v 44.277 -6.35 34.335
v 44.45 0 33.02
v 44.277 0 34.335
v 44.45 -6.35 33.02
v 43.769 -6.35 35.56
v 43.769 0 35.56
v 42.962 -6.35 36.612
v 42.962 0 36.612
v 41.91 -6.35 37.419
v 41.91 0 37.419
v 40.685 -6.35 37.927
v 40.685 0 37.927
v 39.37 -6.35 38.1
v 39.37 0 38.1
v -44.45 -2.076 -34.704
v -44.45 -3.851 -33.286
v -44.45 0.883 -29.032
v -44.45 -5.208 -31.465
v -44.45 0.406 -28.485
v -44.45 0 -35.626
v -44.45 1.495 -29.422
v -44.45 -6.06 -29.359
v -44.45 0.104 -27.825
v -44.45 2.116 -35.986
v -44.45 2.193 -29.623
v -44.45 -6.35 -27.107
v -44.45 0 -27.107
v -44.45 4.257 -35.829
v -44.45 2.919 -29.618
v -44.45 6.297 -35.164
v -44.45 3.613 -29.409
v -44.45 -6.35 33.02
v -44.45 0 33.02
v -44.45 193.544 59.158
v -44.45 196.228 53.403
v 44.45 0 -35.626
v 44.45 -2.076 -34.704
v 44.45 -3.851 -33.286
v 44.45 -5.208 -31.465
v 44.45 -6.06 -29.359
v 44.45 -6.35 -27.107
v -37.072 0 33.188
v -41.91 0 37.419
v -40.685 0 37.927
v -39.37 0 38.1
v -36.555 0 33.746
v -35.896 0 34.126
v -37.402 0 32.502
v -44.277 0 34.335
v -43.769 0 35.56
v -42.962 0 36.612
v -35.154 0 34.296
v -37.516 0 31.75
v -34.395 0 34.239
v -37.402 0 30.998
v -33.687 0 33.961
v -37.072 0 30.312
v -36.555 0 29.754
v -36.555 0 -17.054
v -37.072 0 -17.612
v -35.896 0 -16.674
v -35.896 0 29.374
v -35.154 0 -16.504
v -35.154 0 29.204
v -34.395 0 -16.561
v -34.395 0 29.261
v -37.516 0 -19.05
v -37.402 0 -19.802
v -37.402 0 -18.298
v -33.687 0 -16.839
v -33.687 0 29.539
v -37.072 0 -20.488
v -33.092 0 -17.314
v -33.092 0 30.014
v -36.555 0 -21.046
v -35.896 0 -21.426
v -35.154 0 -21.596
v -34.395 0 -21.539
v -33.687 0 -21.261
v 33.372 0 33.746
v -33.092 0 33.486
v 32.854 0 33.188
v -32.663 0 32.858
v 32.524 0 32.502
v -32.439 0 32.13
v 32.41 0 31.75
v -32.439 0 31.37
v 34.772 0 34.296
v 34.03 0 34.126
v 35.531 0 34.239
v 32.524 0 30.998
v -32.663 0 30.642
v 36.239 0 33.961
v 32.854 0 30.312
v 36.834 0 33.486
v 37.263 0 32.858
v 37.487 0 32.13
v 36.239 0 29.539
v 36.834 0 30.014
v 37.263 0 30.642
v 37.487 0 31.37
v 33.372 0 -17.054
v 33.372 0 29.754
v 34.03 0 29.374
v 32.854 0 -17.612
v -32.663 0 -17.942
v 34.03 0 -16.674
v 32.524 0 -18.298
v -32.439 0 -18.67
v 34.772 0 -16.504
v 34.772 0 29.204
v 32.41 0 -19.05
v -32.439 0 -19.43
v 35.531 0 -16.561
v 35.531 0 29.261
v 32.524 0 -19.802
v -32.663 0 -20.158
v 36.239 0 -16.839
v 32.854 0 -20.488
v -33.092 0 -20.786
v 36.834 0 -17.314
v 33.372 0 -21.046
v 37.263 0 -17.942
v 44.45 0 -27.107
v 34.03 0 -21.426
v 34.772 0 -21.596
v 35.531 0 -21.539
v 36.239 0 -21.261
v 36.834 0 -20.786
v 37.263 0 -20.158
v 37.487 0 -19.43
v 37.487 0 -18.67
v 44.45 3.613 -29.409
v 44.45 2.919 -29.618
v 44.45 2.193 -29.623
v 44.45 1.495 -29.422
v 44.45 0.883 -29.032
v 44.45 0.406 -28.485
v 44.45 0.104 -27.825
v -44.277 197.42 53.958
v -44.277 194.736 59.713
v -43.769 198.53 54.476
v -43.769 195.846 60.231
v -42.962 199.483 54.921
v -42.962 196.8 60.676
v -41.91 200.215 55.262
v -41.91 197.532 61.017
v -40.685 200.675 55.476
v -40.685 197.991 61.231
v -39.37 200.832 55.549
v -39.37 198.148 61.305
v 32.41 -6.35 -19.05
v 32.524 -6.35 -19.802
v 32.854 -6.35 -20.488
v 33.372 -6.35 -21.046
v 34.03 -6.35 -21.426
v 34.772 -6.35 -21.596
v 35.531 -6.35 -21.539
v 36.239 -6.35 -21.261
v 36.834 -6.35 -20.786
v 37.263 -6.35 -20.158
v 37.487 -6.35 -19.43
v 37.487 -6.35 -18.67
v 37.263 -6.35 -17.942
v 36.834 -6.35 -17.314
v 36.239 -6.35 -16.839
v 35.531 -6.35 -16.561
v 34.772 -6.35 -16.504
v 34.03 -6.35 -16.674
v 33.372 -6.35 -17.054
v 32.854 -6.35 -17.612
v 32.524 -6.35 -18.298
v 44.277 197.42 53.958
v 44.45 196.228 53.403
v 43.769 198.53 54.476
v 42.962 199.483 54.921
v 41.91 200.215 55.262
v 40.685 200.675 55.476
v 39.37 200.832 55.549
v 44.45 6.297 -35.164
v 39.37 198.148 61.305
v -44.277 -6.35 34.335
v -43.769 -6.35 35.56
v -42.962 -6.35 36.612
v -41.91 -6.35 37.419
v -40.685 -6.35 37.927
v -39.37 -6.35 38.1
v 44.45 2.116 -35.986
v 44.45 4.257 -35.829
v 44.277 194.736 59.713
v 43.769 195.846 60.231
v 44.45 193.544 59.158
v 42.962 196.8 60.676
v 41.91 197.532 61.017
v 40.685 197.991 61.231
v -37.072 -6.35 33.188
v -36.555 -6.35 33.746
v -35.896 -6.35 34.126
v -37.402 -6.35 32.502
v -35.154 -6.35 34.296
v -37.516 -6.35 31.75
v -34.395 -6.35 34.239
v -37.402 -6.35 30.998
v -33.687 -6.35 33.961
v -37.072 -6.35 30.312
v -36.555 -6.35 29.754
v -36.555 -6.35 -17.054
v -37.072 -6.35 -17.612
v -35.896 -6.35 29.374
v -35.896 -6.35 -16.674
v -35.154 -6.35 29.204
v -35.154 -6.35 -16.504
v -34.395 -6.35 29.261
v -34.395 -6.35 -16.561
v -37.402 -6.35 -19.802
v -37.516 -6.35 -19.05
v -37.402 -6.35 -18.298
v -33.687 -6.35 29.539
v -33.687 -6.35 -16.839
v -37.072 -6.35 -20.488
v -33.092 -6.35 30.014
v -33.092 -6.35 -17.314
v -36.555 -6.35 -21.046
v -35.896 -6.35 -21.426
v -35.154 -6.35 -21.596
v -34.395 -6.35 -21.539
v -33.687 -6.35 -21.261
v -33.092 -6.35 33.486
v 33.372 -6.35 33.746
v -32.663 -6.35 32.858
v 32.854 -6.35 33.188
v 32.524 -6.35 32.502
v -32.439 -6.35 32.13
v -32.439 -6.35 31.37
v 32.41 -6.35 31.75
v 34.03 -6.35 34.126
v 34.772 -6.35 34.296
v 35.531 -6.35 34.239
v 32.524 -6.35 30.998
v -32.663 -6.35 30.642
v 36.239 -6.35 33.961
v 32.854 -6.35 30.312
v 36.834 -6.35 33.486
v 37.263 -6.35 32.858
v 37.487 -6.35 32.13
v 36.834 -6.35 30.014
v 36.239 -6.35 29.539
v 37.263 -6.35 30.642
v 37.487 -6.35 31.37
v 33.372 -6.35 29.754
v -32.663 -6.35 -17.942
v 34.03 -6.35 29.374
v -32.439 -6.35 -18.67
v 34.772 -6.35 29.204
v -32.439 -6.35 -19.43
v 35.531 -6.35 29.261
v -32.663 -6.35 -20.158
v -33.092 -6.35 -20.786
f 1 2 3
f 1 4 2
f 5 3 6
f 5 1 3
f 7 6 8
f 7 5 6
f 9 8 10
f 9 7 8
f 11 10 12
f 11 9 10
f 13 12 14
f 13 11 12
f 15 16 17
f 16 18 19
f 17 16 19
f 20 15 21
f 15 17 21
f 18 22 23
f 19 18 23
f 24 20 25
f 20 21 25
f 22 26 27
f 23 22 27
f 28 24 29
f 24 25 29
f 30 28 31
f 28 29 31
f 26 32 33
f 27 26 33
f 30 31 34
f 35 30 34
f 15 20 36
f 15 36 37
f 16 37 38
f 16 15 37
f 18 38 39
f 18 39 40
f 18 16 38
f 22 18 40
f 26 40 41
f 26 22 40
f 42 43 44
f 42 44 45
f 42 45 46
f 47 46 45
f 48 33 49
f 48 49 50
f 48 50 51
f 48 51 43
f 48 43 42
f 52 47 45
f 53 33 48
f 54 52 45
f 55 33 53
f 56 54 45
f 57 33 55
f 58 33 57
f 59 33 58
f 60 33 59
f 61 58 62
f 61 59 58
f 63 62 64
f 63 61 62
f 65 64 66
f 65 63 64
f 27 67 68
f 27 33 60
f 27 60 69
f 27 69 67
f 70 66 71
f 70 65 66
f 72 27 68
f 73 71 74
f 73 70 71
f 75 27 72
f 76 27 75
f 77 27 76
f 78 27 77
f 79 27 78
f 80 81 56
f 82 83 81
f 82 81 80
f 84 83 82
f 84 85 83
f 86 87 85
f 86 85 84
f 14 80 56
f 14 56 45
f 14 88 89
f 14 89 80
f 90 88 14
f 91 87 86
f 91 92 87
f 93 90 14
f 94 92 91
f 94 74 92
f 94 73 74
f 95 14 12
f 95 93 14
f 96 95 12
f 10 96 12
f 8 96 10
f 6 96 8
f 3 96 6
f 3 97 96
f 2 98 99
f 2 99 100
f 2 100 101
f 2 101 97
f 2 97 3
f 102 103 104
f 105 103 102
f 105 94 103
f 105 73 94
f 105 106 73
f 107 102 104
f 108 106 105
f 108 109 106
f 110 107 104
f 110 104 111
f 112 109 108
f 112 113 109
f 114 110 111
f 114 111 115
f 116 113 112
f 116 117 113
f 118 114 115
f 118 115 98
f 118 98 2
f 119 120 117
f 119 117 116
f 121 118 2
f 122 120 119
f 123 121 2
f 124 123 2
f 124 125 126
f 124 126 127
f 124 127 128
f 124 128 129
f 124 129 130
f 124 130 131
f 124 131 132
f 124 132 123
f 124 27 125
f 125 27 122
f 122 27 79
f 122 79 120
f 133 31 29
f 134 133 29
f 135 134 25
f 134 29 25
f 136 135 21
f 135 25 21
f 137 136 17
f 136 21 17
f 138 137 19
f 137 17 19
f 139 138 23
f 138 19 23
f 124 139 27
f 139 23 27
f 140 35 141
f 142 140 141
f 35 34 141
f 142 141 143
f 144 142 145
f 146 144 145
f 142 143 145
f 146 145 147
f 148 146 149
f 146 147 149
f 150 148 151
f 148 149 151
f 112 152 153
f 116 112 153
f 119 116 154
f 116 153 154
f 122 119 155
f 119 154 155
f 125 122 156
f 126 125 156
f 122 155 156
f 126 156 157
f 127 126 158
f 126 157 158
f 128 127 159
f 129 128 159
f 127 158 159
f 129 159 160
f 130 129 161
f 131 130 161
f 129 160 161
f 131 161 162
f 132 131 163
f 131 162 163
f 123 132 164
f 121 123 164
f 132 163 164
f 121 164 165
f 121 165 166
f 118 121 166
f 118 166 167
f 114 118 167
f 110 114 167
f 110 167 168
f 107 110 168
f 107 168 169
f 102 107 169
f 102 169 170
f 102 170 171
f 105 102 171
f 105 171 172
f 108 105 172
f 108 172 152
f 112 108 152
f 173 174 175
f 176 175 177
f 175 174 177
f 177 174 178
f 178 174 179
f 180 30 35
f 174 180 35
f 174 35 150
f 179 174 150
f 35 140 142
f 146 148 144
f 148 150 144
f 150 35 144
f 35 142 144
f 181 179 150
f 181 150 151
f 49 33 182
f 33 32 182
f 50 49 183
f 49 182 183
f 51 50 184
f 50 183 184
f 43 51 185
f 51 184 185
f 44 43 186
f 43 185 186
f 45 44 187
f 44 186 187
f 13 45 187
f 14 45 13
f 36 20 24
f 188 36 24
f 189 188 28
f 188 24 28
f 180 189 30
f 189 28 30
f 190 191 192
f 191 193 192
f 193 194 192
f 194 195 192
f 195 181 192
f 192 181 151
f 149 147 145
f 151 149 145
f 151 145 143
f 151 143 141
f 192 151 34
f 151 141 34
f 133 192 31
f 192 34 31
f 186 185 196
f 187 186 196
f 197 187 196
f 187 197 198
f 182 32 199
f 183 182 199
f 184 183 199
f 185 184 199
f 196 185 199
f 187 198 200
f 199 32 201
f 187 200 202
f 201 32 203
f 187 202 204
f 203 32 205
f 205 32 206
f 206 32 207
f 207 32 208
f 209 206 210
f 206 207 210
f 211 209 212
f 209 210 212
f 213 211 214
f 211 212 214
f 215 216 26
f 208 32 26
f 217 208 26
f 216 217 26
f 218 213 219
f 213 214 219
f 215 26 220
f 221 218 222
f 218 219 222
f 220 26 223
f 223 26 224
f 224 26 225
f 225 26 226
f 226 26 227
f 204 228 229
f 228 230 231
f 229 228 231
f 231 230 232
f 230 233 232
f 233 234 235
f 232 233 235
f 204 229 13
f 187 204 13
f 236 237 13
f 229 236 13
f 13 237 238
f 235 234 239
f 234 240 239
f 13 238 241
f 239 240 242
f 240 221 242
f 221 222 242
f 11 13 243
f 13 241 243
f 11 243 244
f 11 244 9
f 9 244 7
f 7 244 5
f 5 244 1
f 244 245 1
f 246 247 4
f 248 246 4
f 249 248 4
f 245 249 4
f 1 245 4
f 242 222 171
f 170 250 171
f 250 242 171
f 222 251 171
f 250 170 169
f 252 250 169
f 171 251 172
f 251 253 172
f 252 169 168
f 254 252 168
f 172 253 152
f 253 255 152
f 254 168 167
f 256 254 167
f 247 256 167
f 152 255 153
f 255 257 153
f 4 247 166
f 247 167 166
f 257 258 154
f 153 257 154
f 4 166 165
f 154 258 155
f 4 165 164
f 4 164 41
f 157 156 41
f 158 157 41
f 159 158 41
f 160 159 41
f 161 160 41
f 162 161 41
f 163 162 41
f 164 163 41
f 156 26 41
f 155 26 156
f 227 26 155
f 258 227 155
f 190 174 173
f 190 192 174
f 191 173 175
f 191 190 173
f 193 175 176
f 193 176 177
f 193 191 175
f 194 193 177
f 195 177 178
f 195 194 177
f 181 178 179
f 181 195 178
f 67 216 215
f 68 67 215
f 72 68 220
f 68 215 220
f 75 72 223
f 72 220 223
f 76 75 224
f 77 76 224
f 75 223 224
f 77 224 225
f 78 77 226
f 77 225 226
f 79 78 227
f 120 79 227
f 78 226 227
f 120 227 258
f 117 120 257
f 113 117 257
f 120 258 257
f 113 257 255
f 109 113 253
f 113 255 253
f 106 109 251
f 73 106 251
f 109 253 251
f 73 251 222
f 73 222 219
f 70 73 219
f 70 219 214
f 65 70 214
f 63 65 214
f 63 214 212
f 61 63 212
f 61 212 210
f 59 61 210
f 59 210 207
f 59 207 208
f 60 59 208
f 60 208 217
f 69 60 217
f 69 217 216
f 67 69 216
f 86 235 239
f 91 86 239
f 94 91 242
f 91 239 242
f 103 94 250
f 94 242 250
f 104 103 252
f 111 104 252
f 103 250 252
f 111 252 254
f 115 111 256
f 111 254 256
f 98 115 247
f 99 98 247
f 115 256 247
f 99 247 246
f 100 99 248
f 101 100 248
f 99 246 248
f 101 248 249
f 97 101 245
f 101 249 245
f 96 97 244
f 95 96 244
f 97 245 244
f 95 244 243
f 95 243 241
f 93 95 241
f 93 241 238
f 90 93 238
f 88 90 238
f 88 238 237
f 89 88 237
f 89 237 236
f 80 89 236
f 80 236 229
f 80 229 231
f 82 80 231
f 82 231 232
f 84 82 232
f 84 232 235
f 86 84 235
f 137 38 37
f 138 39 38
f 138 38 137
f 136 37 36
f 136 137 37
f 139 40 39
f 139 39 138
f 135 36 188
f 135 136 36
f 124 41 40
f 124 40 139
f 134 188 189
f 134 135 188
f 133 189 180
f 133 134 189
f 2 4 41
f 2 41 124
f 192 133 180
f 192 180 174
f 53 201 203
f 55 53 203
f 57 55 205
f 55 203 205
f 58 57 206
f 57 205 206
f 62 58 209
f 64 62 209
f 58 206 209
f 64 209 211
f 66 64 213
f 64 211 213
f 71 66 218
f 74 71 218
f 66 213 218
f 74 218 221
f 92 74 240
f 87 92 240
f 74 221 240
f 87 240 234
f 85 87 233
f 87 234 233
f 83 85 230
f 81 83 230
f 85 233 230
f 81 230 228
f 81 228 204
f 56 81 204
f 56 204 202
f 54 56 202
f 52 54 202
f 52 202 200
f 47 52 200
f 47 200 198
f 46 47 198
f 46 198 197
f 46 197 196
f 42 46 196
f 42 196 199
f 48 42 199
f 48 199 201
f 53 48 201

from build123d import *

# Parameters (mm, degrees)
SKETCH1_W                      = 88.9
SKETCH1_H                      = 76.2
BASE_FLANGE1_DEPTH             = 6.35
EDGE_FLANGE1_START             = -44.45
EDGE_FLANGE1_DEPTH             = 88.9
EDGE_FLANGE1_2_DEPTH           = 88.9
F_7_0_201_DIAMETER_HOLE1_D     = 5.1054
F_7_0_201_DIAMETER_HOLE1_DEPTH = 6.35
FILLET1_R                      = 5.08


# Read off the part's stored shape, not the designer's step: Edge-Flange1
# Sheet-metal steps are written as plain solids
with BuildPart() as part:
    # Sketch1 → Base-Flange1 (new body)
    with BuildSketch(Plane(origin=(0, 0, 0), x_dir=(1, 0, 0), z_dir=(0, 1, 0))):
        Rectangle(SKETCH1_W, SKETCH1_H)
    extrude(amount=-BASE_FLANGE1_DEPTH)

    # Edge-Flange1 outline → Edge-Flange1 (cut)
    with BuildSketch(Plane.YZ.offset(EDGE_FLANGE1_START)):
        with BuildLine():
            Line((0, -38.1), (0, -35.625967843))
            ThreePointArc((0, -35.625967843), (-4.587857322, -32.419340017), (-6.35, -27.106548849))
            Line((-6.35, -27.106548849), (-6.35, -38.1))
            Line((-6.35, -38.1), (0, -38.1))
        make_face()
    extrude(amount=EDGE_FLANGE1_DEPTH, mode=Mode.SUBTRACT)

    # Edge-Flange1 2 outline → Edge-Flange1 2 (add)
    with BuildSketch(Plane.YZ.offset(EDGE_FLANGE1_START)):
        with BuildLine():
            ThreePointArc((0, -35.625967843), (3.190967678, -35.972683355), (6.297076347, -35.163625075))
            Line((6.297076347, -35.163625075), (200.831960117, 55.549481005))
            Line((200.831960117, 55.549481005), (198.148334155, 61.304535452))
            Line((198.148334155, 61.304535452), (3.613450385, -29.408570628))
            ThreePointArc((3.613450385, -29.408570628), (1.175258995, -29.248763121), (0, -27.106548849))
            Line((0, -27.106548849), (0, -35.625967843))
        make_face()
    extrude(amount=EDGE_FLANGE1_2_DEPTH)

    # #7 (0.201) Diameter Hole1
    with Locations(Plane(origin=(0, 0, 0), x_dir=(1, 0, 0), z_dir=(0, 1, 0))):
        with Locations((-34.9631, 19.05), (34.9631, 19.05), (34.9631, -31.75), (-34.9631, -31.75)):
            Hole(F_7_0_201_DIAMETER_HOLE1_D / 2, depth=F_7_0_201_DIAMETER_HOLE1_DEPTH)

    # Fillet1
    fillet1_edges = [part.edges().sort_by_distance(p)[0] for p in [
        (44.45, 199.490147136, 58.427008229),
        (-44.45, 199.490147136, 58.427008229),
        (44.45, -3.175, 38.1),
        (-44.45, -3.175, 38.1),
    ]]
    fillet(fillet1_edges, radius=FILLET1_R)


solid = part.part
